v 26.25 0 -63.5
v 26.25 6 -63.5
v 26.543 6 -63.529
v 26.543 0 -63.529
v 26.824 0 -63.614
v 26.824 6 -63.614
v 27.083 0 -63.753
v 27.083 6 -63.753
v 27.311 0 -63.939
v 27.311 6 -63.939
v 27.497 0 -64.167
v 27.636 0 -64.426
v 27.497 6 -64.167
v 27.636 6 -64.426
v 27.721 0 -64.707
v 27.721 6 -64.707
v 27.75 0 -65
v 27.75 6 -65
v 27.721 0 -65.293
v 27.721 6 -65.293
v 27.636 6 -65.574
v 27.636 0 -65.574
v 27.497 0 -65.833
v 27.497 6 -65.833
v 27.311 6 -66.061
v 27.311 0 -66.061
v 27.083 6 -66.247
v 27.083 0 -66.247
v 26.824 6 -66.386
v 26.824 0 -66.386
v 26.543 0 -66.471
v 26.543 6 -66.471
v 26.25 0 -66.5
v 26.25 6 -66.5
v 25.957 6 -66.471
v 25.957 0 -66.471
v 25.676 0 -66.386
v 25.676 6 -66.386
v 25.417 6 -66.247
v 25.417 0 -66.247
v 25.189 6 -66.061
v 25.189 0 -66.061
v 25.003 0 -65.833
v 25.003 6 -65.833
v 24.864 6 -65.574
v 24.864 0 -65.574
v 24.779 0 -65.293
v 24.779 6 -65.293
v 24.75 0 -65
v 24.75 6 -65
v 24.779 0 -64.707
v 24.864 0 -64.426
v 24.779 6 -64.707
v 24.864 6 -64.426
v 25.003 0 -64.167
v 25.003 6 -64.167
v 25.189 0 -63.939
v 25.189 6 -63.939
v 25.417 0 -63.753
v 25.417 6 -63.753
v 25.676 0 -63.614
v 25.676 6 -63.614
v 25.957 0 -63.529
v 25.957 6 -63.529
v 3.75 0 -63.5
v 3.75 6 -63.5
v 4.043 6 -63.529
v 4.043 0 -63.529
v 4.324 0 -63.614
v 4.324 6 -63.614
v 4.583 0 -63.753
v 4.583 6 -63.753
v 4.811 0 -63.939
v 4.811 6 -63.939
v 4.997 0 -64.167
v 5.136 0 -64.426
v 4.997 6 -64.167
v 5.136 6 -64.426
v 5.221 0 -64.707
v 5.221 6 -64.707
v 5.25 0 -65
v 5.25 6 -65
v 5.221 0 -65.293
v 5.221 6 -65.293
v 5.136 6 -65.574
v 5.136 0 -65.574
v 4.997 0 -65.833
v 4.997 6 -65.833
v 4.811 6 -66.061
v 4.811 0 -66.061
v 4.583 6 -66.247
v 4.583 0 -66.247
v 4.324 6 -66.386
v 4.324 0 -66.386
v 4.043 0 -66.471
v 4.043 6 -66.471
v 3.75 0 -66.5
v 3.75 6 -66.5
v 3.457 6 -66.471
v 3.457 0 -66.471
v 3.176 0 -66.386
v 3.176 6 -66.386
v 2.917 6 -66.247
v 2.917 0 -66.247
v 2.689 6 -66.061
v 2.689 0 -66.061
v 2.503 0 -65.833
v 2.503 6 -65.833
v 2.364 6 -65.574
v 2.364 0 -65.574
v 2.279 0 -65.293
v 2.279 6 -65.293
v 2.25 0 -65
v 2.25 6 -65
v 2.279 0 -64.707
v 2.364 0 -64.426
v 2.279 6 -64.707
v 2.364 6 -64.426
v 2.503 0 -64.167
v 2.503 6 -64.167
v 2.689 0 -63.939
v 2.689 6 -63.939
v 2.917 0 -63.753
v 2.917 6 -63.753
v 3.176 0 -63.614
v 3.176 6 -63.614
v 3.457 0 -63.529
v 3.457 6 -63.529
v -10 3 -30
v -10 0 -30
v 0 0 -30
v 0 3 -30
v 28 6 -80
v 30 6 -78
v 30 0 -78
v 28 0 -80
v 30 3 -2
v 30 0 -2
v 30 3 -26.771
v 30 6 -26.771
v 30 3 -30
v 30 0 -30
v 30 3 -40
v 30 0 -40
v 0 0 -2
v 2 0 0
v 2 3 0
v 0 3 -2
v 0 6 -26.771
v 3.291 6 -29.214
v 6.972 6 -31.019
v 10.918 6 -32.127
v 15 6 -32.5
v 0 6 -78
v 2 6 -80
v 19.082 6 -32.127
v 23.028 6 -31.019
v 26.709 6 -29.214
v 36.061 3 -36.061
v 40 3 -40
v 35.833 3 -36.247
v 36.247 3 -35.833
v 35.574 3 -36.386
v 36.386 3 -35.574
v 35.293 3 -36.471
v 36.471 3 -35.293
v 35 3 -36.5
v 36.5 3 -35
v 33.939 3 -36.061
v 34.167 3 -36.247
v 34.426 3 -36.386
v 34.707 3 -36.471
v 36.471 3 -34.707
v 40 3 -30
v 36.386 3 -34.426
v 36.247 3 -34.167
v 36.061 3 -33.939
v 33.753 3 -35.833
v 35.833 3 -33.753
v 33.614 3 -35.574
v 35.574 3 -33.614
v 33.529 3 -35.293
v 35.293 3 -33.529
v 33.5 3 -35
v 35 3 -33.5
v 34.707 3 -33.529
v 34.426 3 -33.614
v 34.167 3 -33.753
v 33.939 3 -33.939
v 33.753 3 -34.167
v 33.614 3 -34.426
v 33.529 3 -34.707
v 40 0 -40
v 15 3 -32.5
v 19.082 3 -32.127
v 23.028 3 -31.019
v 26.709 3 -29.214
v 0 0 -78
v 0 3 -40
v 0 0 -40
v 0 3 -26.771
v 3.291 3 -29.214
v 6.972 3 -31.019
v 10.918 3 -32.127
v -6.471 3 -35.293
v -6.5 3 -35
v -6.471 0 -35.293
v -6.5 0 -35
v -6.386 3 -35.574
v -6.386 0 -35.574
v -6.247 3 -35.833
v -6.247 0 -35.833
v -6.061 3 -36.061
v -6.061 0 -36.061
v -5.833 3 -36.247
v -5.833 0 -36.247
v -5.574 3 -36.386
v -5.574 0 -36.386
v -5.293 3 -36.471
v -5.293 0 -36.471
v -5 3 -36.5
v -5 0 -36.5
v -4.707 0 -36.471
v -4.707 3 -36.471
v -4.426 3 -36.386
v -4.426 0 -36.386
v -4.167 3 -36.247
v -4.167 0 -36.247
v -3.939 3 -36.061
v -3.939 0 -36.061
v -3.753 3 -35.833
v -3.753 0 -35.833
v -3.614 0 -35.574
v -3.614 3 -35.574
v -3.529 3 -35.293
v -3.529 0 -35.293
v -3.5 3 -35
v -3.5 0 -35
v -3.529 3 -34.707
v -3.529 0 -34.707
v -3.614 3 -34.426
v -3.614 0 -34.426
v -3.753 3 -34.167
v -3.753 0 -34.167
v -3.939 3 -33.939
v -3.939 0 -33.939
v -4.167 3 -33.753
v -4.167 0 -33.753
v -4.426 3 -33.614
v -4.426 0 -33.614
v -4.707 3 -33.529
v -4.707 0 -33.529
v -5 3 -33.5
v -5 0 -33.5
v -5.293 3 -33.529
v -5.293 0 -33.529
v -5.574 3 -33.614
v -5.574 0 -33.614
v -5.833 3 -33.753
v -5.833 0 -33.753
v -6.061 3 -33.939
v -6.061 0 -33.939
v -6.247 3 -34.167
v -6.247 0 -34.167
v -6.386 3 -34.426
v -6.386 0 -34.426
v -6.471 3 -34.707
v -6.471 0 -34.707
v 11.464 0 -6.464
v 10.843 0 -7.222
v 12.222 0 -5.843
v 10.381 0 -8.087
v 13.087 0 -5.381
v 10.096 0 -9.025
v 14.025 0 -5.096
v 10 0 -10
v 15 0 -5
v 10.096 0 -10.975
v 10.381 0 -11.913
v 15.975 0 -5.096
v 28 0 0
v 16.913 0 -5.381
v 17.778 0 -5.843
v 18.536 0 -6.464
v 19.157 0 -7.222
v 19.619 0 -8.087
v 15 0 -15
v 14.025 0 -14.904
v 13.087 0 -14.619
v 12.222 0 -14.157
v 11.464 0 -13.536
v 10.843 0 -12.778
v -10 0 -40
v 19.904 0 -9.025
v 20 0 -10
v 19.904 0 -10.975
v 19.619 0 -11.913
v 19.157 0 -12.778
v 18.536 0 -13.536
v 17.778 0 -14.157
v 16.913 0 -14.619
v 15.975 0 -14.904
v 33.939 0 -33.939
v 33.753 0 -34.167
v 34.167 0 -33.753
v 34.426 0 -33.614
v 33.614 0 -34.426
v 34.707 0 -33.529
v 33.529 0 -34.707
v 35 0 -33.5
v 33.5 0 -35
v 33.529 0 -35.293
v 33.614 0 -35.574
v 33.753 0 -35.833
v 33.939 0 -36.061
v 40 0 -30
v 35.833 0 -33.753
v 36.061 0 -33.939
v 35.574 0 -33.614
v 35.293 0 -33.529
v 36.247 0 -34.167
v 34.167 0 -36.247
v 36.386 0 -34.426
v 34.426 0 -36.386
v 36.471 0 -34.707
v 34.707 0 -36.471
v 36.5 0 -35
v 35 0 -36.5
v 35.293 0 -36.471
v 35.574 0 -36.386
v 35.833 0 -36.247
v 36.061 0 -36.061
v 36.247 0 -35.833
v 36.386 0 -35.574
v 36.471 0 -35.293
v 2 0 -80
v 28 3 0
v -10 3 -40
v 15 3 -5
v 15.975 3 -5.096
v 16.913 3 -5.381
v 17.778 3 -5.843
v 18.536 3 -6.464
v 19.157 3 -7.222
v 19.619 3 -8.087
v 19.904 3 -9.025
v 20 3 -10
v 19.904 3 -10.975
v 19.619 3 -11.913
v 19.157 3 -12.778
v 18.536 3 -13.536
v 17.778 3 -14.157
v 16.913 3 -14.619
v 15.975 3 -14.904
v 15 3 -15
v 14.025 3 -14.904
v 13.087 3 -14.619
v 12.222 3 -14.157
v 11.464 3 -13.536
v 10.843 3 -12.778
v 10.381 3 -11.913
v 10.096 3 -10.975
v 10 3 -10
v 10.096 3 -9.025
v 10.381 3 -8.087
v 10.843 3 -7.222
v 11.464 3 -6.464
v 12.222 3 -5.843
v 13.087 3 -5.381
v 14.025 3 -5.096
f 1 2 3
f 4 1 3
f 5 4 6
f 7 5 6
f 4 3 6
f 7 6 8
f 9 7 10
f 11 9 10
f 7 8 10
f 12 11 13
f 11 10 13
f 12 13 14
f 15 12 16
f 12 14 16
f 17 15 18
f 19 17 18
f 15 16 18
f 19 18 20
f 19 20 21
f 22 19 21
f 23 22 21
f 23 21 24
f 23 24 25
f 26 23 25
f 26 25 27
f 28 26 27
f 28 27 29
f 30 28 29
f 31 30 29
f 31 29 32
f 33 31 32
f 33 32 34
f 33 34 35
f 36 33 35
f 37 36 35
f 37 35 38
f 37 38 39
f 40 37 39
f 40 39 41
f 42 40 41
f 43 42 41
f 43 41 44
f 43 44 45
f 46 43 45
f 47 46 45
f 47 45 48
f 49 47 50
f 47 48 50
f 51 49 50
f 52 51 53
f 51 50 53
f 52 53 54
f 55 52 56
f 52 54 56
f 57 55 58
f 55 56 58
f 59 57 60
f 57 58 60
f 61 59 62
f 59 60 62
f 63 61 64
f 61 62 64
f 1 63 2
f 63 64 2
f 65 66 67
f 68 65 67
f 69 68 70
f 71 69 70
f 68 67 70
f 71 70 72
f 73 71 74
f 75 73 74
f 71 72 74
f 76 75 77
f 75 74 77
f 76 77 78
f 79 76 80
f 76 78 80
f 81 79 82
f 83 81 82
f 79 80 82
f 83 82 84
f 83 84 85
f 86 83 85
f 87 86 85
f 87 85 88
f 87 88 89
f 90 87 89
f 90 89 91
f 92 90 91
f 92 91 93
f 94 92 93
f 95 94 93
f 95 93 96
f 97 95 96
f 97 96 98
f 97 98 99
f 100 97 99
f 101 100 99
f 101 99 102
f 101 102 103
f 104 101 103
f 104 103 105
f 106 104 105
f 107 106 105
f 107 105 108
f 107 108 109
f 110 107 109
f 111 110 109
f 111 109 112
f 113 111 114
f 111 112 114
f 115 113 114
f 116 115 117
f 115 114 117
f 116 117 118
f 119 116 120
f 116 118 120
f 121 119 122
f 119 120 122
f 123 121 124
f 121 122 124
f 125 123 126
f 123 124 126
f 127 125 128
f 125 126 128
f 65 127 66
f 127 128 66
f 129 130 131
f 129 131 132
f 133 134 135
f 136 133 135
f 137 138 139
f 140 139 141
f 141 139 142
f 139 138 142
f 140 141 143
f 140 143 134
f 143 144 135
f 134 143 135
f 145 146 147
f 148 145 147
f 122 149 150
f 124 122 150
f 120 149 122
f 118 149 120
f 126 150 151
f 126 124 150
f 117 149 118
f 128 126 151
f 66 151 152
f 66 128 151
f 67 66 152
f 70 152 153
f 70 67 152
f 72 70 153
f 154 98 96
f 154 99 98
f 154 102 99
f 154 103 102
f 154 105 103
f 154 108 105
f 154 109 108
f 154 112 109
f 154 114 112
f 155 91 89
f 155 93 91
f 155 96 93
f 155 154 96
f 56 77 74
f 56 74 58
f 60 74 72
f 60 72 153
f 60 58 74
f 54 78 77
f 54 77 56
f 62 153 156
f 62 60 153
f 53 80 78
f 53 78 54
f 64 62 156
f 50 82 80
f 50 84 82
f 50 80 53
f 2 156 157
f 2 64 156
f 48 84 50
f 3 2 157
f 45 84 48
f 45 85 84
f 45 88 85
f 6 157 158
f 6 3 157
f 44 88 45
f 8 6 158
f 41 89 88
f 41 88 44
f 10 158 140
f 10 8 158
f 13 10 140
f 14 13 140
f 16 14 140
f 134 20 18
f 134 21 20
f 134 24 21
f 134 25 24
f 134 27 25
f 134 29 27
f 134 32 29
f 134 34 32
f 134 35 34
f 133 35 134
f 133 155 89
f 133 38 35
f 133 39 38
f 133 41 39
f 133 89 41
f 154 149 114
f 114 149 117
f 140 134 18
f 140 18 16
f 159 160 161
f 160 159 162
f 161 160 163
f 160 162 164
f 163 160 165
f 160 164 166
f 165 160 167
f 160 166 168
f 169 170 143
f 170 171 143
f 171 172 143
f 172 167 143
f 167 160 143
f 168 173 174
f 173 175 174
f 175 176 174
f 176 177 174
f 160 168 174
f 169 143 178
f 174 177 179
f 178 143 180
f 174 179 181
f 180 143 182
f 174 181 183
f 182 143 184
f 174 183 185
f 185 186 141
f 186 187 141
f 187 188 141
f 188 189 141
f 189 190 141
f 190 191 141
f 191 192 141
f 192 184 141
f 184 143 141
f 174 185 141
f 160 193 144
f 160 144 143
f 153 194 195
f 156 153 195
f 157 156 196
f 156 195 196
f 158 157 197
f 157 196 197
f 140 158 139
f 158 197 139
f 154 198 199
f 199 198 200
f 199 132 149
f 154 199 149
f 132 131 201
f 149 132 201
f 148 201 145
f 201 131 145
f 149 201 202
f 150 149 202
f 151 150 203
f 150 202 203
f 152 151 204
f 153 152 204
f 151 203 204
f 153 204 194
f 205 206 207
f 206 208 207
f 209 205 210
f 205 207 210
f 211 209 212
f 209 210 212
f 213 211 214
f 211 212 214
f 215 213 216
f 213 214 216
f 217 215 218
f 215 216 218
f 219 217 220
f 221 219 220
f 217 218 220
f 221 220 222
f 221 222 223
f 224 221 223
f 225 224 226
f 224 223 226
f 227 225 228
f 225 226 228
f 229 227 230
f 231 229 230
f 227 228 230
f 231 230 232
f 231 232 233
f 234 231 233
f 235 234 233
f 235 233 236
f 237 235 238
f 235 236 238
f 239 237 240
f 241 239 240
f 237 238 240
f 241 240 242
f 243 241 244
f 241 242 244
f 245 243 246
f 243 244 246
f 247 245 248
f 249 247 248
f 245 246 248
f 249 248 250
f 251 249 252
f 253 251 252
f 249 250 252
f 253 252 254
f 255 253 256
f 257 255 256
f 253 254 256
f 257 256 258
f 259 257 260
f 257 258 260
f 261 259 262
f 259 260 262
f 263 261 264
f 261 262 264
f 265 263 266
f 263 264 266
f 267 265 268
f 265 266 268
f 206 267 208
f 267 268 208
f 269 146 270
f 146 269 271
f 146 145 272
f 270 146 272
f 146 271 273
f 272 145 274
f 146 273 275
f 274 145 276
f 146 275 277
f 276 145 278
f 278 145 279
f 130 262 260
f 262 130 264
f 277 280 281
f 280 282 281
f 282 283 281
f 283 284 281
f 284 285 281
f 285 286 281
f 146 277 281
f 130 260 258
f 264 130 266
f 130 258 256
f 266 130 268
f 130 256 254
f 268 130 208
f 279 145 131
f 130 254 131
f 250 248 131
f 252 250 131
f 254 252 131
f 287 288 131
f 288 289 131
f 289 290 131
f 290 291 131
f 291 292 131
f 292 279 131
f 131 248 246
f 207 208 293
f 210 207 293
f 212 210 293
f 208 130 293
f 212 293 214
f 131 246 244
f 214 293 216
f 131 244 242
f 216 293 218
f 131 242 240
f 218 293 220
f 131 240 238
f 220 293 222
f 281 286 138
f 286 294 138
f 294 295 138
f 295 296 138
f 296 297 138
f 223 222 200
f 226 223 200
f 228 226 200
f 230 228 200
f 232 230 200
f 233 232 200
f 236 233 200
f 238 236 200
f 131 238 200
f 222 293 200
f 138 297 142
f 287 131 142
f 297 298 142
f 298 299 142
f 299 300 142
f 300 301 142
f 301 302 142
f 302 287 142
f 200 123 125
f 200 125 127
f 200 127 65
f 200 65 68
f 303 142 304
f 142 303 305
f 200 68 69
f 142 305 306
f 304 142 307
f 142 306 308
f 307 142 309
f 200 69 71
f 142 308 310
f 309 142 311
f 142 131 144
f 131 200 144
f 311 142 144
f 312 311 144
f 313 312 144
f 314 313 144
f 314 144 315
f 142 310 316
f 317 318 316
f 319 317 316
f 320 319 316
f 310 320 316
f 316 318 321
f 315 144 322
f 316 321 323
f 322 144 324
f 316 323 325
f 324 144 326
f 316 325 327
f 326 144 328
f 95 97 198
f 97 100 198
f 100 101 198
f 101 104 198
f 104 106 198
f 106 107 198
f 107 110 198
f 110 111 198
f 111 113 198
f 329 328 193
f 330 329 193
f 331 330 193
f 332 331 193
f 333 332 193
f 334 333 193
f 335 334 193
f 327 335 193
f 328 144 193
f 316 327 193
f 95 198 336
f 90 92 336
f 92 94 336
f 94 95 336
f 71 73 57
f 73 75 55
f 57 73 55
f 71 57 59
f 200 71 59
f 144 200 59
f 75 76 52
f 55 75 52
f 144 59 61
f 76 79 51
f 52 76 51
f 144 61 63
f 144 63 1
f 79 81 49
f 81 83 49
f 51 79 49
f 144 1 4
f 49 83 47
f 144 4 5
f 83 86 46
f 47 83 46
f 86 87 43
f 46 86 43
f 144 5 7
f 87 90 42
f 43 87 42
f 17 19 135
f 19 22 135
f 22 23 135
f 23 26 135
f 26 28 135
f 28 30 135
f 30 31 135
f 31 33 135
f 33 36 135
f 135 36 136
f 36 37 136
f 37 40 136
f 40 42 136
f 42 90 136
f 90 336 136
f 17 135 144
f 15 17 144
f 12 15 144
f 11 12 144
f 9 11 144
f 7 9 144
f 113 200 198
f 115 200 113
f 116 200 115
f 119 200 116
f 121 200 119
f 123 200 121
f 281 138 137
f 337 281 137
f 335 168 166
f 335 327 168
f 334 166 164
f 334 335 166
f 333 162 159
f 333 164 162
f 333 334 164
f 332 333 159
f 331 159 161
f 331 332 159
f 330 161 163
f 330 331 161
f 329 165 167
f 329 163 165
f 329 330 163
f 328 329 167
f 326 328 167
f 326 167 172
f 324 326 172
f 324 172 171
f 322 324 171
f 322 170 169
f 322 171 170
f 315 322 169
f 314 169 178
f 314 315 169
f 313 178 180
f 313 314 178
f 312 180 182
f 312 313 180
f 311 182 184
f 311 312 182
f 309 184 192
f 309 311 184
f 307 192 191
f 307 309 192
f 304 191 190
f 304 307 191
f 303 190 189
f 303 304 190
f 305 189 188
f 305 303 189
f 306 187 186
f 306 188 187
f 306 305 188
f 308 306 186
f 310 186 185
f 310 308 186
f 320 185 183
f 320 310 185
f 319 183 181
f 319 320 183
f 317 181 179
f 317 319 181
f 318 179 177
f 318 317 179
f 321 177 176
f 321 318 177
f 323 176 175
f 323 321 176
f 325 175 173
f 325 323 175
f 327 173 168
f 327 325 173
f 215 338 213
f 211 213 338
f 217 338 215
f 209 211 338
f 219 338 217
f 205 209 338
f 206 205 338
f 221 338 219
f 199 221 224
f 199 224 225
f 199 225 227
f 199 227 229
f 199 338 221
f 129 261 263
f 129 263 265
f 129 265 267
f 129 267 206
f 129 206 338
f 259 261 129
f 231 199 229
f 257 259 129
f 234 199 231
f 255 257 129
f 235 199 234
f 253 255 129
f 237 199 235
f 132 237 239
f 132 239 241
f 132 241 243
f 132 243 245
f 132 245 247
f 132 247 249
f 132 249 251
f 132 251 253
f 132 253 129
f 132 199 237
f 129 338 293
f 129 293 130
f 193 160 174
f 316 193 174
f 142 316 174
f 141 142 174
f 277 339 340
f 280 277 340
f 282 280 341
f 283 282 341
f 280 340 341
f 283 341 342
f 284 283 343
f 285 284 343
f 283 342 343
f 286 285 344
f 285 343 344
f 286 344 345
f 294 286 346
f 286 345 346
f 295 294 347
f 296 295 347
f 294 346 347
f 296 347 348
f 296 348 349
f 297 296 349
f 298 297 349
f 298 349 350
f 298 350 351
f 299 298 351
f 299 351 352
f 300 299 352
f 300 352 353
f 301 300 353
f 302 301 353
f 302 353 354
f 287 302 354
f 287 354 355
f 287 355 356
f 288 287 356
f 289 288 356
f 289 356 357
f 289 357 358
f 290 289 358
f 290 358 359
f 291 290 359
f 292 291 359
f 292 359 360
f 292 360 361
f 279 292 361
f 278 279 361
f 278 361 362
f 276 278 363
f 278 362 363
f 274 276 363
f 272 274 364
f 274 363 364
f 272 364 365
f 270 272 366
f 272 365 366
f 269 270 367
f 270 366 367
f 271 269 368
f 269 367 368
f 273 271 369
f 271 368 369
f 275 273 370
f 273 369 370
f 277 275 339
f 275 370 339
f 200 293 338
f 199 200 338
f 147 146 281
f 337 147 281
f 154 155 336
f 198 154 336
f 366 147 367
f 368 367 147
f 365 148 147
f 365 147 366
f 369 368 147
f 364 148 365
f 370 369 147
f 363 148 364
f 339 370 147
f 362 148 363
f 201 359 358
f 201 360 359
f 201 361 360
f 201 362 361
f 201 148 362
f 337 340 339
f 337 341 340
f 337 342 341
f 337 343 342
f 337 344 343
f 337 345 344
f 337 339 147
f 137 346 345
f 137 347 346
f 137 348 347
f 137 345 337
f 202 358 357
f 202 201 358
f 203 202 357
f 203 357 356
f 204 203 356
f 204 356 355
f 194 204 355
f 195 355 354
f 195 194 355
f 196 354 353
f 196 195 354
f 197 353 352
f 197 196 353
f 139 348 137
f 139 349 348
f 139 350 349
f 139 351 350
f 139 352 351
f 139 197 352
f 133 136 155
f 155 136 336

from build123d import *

# Parameters (mm, degrees)
SKETCH1_W                       = 30
SKETCH1_H                       = 80
BOSS_EXTRUDE1_DEPTH             = 3
BOSS_EXTRUDE2_DEPTH             = 3
SKETCH3_R                       = 5
CUT_EXTRUDE1_DEPTH              = 86.492689746
CHAMFER1_SIZE                   = 2
SKETCH4_R                       = 1.5
CUT_EXTRUDE2_DEPTH              = 86.650452421
SKETCH5_W                       = 10
SKETCH5_H                       = 3
BOSS_EXTRUDE3_DEPTH             = 10
F_3_0MM_DOWEL_HOLE1_D           = 3
F_3_0MM_DOWEL_HOLE1_CSINK_D     = 3.05
F_3_0MM_DOWEL_HOLE1_CSINK_ANGLE = 90


with BuildPart() as part:
    # Sketch1 → Boss-Extrude1 (new body)
    with BuildSketch(Plane(origin=(0, 0, 0), x_dir=(1, 0, 0), z_dir=(0, 1, 0))):
        with Locations((15, 40)):
            Rectangle(SKETCH1_W, SKETCH1_H)
    extrude(amount=BOSS_EXTRUDE1_DEPTH)

    # Sketch2 → Boss-Extrude2 (add)
    with BuildSketch(Plane(origin=(0, 3, 0), x_dir=(1, 0, 0), z_dir=(0, 1, 0))):
        with BuildLine():
            Line((15, 80), (0, 80))
            Line((0, 80), (0, 26.770509831))
            ThreePointArc((0, 26.770509831), (6.97150298, 31.018878077), (15, 32.5))
            Line((15, 32.5), (15, 80))
        make_face()
        with BuildLine():
            Line((30, 80), (15, 80))
            Line((15, 80), (15, 32.5))
            ThreePointArc((15, 32.5), (23.02849702, 31.018878077), (30, 26.770509831))
            Line((30, 26.770509831), (30, 80))
        make_face()
    extrude(amount=BOSS_EXTRUDE2_DEPTH)

    # Sketch3 → Cut-Extrude1 (cut, through all)
    with BuildSketch(Plane(origin=(0, 3, 0), x_dir=(1, 0, 0), z_dir=(0, 1, 0))):
        with Locations(Location((15, 10, 0), (0, 0, 270))):
            Circle(SKETCH3_R)
    extrude(amount=-CUT_EXTRUDE1_DEPTH, mode=Mode.SUBTRACT)

    # Chamfer1
    chamfer1_edges = [part.edges().sort_by_distance(p)[0] for p in [
        (0, 3, -80),
        (30, 3, -80),
        (30, 1.5, 0),
        (0, 1.5, 0),
    ]]
    chamfer(chamfer1_edges, length=CHAMFER1_SIZE)

    # Sketch4 → Cut-Extrude2 (cut, through all)
    with BuildSketch(Plane(origin=(0, 6, 0), x_dir=(1, 0, 0), z_dir=(0, 1, 0))):
        with Locations(Location((3.75, 65, 0), (0, 0, 270))):
            Circle(SKETCH4_R)
        with Locations(Location((26.25, 65, 0), (0, 0, 270))):
            Circle(SKETCH4_R)
    extrude(amount=-CUT_EXTRUDE2_DEPTH, mode=Mode.SUBTRACT)

    # Sketch5 → Boss-Extrude3 (add)
    with BuildSketch(Plane.ZY):
        with Locations((-35, 1.5)):
            Rectangle(SKETCH5_W, SKETCH5_H)
    boss_extrude3 = extrude(amount=BOSS_EXTRUDE3_DEPTH)

    # Ø3.0mm Dowel Hole1 (through all)
    with Locations(Plane(origin=(0, 6, 0), x_dir=(1, 0, 0), z_dir=(0, 1, 0))):
        with Locations((-5, 35)):
            f_3_0mm_dowel_hole1 = CounterSinkHole(F_3_0MM_DOWEL_HOLE1_D / 2, F_3_0MM_DOWEL_HOLE1_CSINK_D / 2, counter_sink_angle=F_3_0MM_DOWEL_HOLE1_CSINK_ANGLE)

    # Mirror1: Boss-Extrude3, Ø3.0mm Dowel Hole1 across plane
    add(boss_extrude3.mirror(Plane.ZY.offset(-15)))
    add(f_3_0mm_dowel_hole1.mirror(Plane.ZY.offset(-15)), mode=Mode.SUBTRACT)


solid = part.part
